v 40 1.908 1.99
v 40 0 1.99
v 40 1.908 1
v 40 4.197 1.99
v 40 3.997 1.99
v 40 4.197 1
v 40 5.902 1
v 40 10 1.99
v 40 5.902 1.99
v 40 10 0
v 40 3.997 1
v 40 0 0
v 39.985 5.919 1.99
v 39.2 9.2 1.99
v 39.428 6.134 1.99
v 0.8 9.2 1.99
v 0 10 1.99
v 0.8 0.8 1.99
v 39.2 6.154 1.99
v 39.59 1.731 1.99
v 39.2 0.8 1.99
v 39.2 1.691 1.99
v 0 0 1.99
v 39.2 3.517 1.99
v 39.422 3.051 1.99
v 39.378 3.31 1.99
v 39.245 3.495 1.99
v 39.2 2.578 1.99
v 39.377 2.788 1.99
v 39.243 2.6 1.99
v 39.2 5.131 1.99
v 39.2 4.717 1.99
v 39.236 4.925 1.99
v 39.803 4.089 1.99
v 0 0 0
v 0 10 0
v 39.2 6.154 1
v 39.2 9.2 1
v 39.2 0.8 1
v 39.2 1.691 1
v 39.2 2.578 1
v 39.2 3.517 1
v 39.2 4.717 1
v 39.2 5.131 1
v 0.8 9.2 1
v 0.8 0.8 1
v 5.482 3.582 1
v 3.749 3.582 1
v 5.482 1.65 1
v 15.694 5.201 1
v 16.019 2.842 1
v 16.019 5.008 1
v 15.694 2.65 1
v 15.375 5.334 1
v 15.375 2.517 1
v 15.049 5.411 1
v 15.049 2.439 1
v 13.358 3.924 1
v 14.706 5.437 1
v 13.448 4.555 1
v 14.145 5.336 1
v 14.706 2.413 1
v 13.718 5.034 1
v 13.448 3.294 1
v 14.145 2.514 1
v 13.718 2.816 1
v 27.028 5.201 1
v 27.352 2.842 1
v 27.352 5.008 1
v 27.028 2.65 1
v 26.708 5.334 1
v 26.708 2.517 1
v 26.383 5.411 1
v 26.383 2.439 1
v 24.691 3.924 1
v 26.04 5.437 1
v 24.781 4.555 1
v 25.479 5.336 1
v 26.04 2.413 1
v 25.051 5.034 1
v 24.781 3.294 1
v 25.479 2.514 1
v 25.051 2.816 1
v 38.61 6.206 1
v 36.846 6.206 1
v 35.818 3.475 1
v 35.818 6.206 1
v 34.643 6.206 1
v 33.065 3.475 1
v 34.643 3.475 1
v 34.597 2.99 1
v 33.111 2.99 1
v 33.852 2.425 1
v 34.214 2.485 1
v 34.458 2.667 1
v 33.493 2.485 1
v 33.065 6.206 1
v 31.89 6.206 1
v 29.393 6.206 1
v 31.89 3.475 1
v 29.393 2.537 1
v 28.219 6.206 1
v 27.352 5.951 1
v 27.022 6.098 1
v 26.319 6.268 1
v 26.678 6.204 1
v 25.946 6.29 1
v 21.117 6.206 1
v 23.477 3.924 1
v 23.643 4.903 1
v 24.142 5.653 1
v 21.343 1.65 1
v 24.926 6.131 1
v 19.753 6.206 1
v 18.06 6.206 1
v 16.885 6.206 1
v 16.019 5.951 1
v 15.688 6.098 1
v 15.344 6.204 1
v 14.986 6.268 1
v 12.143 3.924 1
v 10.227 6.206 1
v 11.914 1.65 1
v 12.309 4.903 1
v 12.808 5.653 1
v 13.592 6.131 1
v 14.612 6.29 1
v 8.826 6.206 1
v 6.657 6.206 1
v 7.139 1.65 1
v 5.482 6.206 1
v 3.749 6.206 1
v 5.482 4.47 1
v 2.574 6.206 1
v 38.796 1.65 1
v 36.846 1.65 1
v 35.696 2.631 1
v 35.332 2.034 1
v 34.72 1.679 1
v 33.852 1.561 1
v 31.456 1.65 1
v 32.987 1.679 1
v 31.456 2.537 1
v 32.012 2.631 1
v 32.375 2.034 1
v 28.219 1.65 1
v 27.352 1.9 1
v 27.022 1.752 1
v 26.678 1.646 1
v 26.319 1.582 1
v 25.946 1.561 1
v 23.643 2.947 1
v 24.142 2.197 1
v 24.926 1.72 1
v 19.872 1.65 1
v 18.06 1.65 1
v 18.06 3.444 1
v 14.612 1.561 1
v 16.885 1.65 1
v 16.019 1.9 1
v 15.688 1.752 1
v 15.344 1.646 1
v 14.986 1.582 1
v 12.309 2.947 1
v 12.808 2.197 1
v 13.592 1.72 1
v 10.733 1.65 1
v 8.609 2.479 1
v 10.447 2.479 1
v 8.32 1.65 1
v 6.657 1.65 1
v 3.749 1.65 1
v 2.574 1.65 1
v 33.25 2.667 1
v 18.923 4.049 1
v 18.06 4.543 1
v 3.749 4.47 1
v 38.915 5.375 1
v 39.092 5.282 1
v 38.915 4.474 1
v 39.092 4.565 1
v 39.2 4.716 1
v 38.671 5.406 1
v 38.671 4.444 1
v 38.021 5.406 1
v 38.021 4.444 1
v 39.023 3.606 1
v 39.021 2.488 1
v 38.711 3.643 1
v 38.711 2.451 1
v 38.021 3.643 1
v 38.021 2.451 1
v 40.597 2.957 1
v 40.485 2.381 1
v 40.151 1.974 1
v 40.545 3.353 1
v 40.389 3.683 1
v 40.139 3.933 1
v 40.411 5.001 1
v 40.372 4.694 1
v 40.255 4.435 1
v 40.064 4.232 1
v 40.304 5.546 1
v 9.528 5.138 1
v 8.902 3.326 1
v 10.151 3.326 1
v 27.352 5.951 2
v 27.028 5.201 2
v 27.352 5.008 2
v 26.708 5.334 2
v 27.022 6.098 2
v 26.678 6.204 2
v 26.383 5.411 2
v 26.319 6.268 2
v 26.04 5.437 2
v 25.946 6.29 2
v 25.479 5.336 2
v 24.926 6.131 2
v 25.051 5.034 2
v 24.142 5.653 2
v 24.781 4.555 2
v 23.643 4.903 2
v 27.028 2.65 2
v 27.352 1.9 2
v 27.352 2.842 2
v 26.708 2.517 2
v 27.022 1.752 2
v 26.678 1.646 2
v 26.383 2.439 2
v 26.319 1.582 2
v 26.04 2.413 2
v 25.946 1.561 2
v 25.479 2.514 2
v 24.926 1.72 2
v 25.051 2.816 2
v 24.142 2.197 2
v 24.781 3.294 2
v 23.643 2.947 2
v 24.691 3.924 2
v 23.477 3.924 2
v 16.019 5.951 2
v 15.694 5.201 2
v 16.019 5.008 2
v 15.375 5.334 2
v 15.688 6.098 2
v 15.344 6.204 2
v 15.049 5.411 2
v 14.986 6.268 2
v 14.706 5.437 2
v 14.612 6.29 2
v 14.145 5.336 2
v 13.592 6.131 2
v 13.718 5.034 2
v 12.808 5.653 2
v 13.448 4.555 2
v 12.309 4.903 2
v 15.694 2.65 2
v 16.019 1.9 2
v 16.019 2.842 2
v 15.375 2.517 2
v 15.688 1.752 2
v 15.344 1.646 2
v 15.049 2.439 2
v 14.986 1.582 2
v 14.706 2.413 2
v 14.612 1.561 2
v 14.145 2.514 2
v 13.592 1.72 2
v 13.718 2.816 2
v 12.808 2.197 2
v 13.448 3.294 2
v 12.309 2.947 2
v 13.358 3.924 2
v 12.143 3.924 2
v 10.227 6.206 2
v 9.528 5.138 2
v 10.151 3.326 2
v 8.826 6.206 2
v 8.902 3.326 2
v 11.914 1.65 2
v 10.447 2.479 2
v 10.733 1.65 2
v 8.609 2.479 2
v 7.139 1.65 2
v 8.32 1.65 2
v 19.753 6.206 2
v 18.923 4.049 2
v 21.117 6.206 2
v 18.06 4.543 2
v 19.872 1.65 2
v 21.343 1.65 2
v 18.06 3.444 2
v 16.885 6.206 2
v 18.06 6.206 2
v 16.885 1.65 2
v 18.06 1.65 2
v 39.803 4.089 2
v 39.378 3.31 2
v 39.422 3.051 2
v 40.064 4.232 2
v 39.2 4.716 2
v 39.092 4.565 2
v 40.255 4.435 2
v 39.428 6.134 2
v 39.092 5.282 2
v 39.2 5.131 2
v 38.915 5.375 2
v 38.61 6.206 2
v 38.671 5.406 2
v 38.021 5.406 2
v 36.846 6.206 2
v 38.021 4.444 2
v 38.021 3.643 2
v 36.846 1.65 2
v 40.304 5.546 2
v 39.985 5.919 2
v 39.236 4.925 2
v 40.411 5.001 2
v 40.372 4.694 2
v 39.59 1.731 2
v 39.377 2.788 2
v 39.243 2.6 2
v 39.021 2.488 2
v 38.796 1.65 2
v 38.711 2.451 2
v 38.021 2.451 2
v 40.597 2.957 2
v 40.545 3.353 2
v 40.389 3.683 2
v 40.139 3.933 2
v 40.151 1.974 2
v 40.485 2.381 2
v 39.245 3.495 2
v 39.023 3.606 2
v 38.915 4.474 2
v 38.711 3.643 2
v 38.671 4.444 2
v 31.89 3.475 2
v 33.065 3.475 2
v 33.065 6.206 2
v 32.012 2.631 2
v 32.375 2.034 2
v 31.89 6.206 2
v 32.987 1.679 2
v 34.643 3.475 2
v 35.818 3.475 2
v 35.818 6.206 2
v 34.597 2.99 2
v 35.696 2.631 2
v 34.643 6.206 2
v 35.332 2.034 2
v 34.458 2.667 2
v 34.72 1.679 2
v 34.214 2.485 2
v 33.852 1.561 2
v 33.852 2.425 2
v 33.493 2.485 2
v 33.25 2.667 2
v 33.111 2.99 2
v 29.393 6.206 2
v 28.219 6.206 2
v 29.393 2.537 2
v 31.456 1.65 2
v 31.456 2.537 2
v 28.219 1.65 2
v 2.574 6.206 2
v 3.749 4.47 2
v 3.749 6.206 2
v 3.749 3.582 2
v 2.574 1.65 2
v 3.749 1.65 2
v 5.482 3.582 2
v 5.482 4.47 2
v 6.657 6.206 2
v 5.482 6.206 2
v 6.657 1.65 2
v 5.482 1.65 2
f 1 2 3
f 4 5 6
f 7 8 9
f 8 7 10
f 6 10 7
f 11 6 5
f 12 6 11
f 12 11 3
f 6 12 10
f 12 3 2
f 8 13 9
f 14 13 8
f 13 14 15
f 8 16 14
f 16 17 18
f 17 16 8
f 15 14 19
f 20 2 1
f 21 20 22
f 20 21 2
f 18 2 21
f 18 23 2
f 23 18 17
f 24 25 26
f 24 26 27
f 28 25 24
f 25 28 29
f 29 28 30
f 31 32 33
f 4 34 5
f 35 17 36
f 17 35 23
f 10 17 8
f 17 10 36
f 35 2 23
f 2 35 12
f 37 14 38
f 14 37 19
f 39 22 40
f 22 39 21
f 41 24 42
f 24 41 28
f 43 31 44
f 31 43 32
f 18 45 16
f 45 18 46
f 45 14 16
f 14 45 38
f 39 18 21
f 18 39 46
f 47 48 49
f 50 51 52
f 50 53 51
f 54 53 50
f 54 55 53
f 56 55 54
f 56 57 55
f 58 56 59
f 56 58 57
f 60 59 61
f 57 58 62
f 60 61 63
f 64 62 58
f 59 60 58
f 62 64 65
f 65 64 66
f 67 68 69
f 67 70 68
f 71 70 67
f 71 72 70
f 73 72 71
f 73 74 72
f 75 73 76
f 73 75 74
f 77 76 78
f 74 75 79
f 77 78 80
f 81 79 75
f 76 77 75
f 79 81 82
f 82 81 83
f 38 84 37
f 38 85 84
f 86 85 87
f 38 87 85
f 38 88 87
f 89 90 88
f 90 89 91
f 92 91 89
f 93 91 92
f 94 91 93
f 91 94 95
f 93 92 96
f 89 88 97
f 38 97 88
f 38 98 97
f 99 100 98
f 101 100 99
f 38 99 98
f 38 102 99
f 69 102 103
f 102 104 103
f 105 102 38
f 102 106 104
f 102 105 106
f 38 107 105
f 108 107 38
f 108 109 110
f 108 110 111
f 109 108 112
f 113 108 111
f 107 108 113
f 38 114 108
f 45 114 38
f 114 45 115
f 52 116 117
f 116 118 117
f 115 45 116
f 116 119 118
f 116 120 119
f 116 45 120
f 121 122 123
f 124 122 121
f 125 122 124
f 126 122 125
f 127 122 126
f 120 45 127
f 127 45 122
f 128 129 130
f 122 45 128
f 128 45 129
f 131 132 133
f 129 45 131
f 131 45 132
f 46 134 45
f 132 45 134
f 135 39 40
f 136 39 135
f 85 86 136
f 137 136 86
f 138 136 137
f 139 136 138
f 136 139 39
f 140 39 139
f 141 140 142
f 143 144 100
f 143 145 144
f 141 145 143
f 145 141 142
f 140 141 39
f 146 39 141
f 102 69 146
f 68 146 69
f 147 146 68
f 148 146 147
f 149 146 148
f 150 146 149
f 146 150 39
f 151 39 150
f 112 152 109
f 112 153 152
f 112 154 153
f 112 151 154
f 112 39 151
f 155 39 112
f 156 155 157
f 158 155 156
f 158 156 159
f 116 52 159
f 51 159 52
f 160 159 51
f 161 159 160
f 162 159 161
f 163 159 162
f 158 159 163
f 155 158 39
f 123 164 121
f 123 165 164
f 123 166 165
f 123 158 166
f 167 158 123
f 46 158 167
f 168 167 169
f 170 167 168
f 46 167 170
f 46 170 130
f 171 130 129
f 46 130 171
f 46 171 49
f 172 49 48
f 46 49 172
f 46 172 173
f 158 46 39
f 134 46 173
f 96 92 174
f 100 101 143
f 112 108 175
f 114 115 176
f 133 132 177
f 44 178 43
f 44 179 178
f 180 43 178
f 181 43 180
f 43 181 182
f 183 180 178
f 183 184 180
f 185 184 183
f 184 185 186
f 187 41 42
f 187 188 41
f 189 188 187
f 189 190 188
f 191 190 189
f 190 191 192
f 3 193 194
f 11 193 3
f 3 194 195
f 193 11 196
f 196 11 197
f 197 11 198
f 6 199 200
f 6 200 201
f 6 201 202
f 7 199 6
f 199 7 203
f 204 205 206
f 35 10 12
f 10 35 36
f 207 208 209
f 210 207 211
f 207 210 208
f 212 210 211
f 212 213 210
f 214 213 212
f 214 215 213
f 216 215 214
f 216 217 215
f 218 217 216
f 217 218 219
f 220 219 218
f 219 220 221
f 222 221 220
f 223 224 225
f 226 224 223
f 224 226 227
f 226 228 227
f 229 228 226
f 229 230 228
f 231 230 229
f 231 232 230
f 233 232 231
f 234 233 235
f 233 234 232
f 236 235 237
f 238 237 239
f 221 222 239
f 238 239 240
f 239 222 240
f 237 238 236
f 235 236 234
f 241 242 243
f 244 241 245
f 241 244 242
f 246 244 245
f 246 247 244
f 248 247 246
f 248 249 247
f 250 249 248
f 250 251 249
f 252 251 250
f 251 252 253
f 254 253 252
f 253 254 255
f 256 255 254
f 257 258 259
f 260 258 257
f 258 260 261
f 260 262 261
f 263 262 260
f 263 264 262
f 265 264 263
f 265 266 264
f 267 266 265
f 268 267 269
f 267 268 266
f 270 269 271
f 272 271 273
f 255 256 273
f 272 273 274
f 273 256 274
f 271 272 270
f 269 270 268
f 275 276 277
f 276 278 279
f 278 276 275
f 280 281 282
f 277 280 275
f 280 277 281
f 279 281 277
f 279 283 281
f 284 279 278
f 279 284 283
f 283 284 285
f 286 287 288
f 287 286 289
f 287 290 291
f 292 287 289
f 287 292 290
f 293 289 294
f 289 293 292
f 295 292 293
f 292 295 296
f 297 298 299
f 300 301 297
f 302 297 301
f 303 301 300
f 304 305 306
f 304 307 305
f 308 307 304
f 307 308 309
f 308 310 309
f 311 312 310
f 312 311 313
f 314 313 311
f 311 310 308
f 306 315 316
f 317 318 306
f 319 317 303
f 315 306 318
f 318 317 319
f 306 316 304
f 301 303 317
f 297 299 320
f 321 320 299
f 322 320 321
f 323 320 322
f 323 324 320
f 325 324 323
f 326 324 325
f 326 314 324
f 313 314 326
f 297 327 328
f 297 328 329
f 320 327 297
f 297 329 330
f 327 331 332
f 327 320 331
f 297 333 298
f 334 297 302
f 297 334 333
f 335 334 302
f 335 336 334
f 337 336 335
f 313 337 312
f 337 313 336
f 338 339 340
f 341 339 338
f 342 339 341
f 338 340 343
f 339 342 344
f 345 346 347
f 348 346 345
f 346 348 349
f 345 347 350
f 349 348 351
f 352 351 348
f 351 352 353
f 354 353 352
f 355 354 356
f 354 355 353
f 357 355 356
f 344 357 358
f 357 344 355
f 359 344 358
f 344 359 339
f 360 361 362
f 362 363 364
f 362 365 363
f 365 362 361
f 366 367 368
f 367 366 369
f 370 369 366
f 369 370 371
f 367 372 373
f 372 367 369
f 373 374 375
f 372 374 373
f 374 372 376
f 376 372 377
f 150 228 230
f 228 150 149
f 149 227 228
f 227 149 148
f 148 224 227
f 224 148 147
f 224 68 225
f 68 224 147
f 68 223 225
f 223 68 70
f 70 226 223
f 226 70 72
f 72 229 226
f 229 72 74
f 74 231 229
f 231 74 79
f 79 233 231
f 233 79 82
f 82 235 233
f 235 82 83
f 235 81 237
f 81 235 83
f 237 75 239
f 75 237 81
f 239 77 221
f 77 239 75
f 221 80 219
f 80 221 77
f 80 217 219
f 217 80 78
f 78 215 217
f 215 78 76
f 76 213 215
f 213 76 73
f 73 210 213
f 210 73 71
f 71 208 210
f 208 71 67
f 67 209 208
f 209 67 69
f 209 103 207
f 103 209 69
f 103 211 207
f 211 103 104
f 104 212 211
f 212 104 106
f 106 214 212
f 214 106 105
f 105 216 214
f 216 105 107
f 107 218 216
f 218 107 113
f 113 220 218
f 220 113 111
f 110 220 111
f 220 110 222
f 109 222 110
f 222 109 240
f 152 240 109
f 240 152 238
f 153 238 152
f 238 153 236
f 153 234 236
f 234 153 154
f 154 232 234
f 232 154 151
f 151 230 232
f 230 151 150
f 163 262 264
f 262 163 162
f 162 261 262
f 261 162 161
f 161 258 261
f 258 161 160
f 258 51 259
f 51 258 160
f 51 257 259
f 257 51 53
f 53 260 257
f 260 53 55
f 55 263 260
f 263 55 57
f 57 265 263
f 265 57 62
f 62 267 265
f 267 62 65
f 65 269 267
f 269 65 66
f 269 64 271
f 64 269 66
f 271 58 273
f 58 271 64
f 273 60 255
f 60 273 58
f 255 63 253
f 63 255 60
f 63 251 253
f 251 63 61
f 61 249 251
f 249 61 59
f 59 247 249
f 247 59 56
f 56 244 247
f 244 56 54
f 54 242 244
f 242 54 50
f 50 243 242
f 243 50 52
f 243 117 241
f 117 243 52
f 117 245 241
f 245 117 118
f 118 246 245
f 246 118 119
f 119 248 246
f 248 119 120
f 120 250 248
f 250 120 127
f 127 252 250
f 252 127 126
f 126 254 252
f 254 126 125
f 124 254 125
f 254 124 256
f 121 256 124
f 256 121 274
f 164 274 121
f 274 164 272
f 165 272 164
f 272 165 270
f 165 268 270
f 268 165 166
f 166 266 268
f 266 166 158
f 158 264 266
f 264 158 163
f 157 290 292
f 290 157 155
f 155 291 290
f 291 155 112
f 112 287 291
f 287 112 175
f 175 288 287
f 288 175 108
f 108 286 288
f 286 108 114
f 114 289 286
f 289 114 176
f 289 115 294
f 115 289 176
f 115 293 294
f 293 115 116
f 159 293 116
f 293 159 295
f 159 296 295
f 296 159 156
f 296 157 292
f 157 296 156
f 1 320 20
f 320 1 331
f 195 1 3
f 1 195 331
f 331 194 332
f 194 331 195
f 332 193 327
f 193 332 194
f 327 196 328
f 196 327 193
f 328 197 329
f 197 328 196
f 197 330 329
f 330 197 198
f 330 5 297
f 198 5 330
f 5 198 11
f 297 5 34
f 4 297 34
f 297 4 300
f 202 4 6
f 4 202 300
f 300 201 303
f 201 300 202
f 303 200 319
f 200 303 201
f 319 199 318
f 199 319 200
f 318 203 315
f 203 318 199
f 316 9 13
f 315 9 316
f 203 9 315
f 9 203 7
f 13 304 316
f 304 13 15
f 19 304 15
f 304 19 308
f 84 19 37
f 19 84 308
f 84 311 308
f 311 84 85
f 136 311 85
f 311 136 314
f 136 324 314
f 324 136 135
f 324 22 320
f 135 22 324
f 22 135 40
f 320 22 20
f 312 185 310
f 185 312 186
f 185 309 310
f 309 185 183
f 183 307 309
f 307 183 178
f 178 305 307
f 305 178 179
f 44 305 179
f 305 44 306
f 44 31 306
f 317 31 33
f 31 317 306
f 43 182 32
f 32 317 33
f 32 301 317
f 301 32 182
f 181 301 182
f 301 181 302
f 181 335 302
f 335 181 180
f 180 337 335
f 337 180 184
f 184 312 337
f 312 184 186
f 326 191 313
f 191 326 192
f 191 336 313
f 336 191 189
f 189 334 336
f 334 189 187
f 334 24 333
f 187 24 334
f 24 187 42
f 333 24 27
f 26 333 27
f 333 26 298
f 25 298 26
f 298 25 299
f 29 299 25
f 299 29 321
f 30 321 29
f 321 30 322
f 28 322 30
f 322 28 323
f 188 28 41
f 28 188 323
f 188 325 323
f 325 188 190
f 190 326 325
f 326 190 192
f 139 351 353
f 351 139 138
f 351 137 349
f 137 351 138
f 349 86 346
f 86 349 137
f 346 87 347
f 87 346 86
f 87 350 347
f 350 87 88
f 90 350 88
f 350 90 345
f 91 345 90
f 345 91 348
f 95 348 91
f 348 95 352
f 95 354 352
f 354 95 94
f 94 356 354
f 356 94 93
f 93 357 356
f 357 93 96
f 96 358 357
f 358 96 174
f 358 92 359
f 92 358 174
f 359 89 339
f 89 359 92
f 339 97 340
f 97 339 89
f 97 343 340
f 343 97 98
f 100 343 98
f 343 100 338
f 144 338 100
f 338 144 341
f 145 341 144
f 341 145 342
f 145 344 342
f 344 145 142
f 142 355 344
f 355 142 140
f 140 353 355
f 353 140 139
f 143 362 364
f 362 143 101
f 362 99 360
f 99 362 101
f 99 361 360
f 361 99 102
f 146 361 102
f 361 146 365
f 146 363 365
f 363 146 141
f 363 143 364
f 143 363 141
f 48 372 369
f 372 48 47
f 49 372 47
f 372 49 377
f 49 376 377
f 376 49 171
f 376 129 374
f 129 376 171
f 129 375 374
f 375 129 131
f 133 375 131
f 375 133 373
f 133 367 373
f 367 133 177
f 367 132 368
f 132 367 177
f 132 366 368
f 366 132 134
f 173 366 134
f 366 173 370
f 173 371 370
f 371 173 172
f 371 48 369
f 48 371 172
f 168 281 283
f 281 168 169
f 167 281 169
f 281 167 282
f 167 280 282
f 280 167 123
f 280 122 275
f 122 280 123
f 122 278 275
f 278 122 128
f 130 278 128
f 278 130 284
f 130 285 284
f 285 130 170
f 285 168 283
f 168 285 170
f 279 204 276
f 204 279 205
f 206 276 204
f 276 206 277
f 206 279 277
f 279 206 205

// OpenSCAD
plate_y=10;
plate_x=plate_y *4;
plate_z=1;
plate_frame=1.6;
plate_text_z=1;

union(){
    color("black")
    cube([plate_x, plate_y, plate_z]);
    translate([0,0,plate_z-.01])
    color("white")
    difference(){
        cube([plate_x, plate_y, plate_text_z]);
        translate([plate_frame/2,plate_frame/2,-.5])
        cube([plate_x-plate_frame, plate_y-plate_frame, plate_text_z+2]);
    }

    color("white")
    translate([plate_x*.05,plate_y*.165,plate_z])
    linear_extrude(height = plate_text_z) {
        text("HACK CLUB", size = 4.5, font = "Arial Bold:style=Bold");
    }
}
